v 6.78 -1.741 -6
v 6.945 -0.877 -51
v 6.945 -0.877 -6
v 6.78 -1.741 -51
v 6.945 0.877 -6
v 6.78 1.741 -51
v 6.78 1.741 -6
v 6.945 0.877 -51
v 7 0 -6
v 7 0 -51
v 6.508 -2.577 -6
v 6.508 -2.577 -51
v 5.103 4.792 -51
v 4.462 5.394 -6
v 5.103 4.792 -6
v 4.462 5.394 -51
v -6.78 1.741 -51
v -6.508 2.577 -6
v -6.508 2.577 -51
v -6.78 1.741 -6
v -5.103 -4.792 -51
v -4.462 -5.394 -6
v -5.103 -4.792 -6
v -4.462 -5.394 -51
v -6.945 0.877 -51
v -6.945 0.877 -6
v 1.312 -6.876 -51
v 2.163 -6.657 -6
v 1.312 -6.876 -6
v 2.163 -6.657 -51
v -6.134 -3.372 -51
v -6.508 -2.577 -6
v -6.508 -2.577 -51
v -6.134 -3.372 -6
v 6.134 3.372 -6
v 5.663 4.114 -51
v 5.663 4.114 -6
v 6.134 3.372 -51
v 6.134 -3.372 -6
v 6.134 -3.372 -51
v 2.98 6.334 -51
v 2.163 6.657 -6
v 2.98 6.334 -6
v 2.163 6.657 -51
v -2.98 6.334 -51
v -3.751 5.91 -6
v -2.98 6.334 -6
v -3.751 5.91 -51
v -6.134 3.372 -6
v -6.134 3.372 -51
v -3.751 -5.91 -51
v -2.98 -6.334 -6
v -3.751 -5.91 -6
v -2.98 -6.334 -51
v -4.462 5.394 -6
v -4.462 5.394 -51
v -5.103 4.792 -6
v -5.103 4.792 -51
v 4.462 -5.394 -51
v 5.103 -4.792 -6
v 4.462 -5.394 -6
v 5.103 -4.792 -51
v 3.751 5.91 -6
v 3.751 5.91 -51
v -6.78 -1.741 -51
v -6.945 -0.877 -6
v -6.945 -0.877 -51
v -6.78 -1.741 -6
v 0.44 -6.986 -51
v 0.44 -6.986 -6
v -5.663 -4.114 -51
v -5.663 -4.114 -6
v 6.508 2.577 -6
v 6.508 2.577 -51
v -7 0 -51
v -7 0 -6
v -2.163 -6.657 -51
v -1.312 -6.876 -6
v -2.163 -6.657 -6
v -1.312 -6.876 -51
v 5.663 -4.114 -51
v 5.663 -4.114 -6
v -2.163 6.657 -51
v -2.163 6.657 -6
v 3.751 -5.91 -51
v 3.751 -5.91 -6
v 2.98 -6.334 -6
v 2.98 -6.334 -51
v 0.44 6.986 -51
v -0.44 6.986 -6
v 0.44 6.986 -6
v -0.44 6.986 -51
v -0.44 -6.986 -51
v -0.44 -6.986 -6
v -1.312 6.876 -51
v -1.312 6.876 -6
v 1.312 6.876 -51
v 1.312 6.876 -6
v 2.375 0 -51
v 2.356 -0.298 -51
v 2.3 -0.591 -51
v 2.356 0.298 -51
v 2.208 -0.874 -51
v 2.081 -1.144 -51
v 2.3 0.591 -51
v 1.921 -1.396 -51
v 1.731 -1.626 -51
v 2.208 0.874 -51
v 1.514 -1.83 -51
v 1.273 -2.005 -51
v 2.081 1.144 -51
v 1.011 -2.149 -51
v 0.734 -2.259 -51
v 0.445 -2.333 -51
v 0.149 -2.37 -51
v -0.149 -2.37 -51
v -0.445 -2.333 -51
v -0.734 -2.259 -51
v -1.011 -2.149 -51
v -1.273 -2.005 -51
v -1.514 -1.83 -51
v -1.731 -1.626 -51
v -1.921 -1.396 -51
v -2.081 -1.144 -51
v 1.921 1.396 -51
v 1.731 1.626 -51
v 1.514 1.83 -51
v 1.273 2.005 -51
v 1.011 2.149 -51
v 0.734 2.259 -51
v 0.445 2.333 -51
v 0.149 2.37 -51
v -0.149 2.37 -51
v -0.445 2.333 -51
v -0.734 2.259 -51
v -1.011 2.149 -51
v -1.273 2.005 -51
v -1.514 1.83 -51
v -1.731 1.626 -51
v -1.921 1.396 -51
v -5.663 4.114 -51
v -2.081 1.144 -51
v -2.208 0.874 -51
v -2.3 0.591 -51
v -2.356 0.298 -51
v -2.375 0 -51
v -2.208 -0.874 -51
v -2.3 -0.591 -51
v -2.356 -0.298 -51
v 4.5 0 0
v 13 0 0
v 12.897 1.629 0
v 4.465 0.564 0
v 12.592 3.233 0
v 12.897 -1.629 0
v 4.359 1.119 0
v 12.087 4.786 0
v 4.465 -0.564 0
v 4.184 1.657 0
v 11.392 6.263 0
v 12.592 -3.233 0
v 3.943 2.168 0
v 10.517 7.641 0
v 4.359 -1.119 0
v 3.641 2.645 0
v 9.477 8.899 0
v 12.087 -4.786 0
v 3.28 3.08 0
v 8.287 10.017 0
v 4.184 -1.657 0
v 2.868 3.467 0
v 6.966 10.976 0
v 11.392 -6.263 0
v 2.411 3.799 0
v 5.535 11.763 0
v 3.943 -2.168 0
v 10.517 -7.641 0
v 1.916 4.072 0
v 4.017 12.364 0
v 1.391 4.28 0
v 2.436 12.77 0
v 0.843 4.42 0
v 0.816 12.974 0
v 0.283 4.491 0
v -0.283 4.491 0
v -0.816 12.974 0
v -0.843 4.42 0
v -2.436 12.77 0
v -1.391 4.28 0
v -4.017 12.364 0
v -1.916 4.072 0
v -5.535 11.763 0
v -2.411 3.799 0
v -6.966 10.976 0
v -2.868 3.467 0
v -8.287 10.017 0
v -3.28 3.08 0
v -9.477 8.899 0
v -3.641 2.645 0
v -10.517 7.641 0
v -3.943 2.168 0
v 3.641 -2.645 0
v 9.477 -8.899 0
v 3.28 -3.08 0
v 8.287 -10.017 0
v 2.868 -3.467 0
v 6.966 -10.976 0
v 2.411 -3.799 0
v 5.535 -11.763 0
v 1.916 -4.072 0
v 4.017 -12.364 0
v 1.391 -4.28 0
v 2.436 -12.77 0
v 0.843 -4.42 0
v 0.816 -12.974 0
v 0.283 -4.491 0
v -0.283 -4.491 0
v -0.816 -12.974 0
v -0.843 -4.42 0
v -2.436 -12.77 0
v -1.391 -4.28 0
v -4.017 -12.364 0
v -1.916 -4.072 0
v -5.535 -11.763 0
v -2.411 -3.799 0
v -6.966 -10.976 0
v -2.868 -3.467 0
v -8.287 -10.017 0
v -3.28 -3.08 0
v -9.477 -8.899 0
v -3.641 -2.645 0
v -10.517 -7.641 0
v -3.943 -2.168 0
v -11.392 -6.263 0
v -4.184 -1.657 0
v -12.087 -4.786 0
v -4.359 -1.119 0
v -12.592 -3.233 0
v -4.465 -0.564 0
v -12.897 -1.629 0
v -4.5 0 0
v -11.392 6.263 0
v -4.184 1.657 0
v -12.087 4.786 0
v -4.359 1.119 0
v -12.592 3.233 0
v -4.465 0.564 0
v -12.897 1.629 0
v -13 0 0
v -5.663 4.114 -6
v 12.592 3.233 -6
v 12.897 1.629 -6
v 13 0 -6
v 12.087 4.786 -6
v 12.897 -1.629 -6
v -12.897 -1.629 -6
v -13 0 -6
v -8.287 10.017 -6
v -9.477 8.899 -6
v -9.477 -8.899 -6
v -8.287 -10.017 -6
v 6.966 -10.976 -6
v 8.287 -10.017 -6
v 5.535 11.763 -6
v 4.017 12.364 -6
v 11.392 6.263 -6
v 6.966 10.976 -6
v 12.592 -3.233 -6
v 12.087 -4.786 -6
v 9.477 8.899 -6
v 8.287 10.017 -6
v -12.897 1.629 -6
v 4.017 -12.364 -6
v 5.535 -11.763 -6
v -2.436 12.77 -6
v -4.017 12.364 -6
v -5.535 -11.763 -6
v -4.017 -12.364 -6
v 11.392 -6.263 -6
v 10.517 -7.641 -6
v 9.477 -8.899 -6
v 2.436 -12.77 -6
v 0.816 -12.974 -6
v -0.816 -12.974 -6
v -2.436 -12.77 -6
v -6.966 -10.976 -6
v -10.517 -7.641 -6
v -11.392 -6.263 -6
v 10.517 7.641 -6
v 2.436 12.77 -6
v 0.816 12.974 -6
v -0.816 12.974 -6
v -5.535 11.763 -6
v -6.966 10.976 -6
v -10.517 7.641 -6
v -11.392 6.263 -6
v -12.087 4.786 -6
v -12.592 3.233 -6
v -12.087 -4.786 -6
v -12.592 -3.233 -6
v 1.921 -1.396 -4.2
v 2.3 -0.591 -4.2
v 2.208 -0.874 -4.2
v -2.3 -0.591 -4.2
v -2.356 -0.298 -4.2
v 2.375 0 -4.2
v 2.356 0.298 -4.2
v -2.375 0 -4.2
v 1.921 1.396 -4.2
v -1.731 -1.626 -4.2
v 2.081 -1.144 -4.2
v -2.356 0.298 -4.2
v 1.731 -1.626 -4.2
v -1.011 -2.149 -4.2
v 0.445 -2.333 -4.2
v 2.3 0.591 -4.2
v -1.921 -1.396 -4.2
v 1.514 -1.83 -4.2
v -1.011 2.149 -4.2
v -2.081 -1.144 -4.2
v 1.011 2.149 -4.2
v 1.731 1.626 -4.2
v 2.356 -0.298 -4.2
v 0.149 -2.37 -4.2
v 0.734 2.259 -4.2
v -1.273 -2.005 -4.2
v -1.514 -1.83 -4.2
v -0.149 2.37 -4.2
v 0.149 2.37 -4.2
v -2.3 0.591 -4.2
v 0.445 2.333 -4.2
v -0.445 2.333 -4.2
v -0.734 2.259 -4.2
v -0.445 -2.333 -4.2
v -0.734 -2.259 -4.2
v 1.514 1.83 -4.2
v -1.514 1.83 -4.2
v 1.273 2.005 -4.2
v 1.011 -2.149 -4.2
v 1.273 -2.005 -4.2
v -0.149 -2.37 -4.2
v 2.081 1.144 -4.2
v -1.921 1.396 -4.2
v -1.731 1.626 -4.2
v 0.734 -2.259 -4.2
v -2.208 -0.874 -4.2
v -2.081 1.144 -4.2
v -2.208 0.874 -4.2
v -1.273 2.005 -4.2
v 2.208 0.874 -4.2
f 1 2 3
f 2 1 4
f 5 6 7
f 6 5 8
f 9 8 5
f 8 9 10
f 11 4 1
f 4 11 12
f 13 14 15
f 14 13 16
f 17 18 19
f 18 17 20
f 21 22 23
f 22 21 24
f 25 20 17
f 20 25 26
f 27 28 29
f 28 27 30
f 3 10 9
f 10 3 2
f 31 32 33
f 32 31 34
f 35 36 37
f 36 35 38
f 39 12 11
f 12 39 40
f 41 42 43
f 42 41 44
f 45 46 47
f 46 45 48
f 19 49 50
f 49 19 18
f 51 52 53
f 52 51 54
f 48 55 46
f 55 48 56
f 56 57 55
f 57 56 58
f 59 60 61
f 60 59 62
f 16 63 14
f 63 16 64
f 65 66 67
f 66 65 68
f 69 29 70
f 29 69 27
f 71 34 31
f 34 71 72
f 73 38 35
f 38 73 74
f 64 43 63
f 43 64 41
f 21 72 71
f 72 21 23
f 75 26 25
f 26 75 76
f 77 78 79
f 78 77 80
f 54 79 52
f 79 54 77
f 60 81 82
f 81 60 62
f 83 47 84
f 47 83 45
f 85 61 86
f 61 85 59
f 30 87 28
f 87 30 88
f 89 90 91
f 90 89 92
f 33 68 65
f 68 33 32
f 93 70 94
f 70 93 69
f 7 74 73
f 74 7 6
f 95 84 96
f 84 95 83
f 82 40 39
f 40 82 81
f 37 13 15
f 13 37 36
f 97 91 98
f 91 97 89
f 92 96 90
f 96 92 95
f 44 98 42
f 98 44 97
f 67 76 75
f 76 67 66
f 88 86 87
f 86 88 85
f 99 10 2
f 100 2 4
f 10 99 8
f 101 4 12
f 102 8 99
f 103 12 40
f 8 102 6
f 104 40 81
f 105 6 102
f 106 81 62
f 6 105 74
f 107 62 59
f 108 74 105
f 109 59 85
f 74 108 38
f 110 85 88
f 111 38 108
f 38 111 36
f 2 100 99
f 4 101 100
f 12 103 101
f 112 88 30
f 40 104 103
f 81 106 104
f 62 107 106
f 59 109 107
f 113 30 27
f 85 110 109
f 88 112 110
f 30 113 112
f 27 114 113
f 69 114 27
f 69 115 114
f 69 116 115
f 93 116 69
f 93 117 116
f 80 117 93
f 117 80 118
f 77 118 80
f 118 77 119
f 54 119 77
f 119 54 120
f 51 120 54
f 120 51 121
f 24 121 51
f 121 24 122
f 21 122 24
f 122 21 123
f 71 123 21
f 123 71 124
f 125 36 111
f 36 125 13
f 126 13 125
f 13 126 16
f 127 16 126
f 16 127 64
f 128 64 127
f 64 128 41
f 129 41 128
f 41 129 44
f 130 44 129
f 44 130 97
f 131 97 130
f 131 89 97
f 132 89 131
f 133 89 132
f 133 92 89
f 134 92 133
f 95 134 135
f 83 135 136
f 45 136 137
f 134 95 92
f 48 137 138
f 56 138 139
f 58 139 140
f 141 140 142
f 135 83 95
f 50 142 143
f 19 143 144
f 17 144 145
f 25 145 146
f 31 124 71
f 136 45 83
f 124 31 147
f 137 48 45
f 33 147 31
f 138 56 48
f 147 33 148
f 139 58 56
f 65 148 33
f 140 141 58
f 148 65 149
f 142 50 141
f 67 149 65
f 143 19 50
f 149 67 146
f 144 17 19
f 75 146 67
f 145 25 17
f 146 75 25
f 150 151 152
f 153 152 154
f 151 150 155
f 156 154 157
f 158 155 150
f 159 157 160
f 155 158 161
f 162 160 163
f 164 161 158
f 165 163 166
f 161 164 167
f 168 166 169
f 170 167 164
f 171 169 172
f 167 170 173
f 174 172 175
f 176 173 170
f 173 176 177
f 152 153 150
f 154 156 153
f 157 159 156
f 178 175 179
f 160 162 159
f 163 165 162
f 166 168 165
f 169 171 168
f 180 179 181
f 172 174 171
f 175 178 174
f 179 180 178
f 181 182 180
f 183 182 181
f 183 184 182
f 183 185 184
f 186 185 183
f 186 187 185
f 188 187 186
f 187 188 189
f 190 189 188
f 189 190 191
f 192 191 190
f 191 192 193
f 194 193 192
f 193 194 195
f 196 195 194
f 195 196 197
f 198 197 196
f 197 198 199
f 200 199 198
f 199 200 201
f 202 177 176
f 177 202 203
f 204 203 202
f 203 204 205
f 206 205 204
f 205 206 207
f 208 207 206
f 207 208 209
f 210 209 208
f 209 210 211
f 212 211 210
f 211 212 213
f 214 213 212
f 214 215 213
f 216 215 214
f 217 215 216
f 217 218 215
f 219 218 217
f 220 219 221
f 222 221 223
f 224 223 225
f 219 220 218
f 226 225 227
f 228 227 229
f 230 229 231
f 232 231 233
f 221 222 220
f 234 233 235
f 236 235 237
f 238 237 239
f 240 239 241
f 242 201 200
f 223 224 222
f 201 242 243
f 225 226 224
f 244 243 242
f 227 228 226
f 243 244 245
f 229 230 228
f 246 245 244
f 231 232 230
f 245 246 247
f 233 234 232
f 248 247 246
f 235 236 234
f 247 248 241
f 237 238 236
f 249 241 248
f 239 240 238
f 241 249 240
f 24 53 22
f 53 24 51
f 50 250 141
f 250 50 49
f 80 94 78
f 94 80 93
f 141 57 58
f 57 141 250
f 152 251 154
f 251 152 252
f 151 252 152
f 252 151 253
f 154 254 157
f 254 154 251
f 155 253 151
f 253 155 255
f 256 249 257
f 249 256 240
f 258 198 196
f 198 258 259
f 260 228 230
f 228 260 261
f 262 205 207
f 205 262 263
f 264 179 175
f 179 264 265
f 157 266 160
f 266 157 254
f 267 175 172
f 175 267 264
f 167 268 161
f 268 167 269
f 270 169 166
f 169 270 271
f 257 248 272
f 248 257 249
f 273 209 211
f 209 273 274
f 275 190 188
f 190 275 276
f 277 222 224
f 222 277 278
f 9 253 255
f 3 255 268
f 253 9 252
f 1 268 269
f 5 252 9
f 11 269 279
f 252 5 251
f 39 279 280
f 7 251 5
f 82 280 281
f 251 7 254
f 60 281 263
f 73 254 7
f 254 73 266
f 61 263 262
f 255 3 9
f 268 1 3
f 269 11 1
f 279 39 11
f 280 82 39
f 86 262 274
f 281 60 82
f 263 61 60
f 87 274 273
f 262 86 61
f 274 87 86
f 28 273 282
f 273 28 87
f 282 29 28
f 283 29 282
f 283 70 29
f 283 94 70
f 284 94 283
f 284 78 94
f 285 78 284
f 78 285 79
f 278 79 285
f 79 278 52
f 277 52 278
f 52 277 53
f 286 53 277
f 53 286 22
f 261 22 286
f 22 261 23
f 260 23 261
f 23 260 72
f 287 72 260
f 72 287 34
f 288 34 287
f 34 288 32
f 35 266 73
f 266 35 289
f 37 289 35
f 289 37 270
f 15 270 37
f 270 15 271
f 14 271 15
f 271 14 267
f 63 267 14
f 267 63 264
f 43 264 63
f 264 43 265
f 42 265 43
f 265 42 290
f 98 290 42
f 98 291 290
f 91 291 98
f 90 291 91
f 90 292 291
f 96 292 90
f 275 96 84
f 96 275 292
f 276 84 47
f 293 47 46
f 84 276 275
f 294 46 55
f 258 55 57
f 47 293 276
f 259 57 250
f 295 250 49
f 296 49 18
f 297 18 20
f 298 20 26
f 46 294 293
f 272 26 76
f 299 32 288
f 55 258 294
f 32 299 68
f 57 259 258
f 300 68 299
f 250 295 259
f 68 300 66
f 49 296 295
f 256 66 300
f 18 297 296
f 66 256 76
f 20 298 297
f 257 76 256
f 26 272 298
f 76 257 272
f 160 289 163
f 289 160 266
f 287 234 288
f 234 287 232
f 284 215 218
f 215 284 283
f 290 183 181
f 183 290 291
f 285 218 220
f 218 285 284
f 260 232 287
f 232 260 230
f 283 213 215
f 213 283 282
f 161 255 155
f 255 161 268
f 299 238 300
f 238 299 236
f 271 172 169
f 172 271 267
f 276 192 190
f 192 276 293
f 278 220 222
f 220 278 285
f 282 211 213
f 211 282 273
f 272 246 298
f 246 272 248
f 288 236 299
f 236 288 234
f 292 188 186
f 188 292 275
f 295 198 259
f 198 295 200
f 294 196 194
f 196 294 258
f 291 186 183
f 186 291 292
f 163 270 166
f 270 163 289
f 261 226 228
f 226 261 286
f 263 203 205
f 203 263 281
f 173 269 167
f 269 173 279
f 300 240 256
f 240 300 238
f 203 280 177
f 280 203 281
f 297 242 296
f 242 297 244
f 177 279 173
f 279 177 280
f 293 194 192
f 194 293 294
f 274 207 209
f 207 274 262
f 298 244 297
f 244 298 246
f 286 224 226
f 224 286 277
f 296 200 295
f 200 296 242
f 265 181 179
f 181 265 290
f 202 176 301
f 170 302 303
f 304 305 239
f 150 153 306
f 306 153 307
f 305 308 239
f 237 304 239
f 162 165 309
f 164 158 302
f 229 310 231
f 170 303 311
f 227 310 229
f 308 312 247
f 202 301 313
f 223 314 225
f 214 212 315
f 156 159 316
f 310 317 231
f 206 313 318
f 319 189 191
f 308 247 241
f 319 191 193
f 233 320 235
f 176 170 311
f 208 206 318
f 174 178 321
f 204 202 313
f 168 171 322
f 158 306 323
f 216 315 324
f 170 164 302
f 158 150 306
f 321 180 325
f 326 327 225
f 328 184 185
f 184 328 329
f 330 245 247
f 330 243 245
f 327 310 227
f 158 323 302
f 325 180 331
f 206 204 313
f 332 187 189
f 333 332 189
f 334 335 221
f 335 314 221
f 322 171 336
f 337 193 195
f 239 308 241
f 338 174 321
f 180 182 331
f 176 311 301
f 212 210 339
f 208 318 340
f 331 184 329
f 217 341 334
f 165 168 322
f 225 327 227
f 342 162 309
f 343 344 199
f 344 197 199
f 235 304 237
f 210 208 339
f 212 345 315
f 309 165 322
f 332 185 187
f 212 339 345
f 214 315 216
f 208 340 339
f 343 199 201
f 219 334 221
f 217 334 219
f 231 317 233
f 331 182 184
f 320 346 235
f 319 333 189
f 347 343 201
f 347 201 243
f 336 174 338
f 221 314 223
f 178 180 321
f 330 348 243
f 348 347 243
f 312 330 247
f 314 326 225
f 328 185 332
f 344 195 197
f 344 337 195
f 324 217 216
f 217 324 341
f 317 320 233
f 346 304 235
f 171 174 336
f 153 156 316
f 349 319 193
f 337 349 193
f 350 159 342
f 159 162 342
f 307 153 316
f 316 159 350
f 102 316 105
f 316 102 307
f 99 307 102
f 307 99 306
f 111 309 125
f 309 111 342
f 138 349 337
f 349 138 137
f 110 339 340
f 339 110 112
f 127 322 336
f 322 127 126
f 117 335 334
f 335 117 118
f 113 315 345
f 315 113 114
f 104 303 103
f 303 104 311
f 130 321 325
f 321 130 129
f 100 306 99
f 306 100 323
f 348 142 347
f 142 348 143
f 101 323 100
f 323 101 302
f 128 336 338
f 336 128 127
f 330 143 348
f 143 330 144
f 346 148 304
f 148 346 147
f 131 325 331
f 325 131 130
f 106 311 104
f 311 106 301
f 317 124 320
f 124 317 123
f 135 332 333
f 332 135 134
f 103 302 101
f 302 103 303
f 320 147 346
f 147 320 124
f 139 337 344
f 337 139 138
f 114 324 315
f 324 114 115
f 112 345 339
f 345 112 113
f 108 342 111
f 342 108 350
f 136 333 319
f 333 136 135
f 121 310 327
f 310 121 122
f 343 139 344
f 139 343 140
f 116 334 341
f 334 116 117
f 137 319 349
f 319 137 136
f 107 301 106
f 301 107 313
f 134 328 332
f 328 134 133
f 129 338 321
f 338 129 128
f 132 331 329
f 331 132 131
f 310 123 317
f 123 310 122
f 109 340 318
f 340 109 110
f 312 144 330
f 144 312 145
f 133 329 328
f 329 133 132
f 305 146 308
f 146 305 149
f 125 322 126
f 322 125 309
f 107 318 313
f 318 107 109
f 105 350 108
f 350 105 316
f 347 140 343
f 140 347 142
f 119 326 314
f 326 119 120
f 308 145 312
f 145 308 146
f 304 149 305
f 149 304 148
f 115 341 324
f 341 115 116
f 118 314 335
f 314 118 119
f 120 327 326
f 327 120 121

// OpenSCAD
$fn = 50;


difference() {
	union() {
		translate(v = [0, 0, -51.0000000000]) {
			cylinder(h = 51, r = 7.0000000000);
		}
		translate(v = [0, 0, -6.0000000000]) {
			cylinder(h = 6, r = 13.0000000000);
		}
	}
	union() {
		translate(v = [0, 0, 0]) {
			rotate(a = [0, 0, 0]) {
				difference() {
					union() {
						#translate(v = [0, 0, -51.0000000000]) {
							cylinder(h = 51, r = 2.2500000000);
						}
						#translate(v = [0, 0, -4.2000000000]) {
							cylinder(h = 4.2000000000, r1 = 2.3750000000, r2 = 4.5000000000);
						}
						#translate(v = [0, 0, -51.0000000000]) {
							cylinder(h = 51, r = 2.3750000000);
						}
						#translate(v = [0, 0, -51.0000000000]) {
							cylinder(h = 51, r = 2.2500000000);
						}
					}
					union();
				}
			}
		}
	}
}
